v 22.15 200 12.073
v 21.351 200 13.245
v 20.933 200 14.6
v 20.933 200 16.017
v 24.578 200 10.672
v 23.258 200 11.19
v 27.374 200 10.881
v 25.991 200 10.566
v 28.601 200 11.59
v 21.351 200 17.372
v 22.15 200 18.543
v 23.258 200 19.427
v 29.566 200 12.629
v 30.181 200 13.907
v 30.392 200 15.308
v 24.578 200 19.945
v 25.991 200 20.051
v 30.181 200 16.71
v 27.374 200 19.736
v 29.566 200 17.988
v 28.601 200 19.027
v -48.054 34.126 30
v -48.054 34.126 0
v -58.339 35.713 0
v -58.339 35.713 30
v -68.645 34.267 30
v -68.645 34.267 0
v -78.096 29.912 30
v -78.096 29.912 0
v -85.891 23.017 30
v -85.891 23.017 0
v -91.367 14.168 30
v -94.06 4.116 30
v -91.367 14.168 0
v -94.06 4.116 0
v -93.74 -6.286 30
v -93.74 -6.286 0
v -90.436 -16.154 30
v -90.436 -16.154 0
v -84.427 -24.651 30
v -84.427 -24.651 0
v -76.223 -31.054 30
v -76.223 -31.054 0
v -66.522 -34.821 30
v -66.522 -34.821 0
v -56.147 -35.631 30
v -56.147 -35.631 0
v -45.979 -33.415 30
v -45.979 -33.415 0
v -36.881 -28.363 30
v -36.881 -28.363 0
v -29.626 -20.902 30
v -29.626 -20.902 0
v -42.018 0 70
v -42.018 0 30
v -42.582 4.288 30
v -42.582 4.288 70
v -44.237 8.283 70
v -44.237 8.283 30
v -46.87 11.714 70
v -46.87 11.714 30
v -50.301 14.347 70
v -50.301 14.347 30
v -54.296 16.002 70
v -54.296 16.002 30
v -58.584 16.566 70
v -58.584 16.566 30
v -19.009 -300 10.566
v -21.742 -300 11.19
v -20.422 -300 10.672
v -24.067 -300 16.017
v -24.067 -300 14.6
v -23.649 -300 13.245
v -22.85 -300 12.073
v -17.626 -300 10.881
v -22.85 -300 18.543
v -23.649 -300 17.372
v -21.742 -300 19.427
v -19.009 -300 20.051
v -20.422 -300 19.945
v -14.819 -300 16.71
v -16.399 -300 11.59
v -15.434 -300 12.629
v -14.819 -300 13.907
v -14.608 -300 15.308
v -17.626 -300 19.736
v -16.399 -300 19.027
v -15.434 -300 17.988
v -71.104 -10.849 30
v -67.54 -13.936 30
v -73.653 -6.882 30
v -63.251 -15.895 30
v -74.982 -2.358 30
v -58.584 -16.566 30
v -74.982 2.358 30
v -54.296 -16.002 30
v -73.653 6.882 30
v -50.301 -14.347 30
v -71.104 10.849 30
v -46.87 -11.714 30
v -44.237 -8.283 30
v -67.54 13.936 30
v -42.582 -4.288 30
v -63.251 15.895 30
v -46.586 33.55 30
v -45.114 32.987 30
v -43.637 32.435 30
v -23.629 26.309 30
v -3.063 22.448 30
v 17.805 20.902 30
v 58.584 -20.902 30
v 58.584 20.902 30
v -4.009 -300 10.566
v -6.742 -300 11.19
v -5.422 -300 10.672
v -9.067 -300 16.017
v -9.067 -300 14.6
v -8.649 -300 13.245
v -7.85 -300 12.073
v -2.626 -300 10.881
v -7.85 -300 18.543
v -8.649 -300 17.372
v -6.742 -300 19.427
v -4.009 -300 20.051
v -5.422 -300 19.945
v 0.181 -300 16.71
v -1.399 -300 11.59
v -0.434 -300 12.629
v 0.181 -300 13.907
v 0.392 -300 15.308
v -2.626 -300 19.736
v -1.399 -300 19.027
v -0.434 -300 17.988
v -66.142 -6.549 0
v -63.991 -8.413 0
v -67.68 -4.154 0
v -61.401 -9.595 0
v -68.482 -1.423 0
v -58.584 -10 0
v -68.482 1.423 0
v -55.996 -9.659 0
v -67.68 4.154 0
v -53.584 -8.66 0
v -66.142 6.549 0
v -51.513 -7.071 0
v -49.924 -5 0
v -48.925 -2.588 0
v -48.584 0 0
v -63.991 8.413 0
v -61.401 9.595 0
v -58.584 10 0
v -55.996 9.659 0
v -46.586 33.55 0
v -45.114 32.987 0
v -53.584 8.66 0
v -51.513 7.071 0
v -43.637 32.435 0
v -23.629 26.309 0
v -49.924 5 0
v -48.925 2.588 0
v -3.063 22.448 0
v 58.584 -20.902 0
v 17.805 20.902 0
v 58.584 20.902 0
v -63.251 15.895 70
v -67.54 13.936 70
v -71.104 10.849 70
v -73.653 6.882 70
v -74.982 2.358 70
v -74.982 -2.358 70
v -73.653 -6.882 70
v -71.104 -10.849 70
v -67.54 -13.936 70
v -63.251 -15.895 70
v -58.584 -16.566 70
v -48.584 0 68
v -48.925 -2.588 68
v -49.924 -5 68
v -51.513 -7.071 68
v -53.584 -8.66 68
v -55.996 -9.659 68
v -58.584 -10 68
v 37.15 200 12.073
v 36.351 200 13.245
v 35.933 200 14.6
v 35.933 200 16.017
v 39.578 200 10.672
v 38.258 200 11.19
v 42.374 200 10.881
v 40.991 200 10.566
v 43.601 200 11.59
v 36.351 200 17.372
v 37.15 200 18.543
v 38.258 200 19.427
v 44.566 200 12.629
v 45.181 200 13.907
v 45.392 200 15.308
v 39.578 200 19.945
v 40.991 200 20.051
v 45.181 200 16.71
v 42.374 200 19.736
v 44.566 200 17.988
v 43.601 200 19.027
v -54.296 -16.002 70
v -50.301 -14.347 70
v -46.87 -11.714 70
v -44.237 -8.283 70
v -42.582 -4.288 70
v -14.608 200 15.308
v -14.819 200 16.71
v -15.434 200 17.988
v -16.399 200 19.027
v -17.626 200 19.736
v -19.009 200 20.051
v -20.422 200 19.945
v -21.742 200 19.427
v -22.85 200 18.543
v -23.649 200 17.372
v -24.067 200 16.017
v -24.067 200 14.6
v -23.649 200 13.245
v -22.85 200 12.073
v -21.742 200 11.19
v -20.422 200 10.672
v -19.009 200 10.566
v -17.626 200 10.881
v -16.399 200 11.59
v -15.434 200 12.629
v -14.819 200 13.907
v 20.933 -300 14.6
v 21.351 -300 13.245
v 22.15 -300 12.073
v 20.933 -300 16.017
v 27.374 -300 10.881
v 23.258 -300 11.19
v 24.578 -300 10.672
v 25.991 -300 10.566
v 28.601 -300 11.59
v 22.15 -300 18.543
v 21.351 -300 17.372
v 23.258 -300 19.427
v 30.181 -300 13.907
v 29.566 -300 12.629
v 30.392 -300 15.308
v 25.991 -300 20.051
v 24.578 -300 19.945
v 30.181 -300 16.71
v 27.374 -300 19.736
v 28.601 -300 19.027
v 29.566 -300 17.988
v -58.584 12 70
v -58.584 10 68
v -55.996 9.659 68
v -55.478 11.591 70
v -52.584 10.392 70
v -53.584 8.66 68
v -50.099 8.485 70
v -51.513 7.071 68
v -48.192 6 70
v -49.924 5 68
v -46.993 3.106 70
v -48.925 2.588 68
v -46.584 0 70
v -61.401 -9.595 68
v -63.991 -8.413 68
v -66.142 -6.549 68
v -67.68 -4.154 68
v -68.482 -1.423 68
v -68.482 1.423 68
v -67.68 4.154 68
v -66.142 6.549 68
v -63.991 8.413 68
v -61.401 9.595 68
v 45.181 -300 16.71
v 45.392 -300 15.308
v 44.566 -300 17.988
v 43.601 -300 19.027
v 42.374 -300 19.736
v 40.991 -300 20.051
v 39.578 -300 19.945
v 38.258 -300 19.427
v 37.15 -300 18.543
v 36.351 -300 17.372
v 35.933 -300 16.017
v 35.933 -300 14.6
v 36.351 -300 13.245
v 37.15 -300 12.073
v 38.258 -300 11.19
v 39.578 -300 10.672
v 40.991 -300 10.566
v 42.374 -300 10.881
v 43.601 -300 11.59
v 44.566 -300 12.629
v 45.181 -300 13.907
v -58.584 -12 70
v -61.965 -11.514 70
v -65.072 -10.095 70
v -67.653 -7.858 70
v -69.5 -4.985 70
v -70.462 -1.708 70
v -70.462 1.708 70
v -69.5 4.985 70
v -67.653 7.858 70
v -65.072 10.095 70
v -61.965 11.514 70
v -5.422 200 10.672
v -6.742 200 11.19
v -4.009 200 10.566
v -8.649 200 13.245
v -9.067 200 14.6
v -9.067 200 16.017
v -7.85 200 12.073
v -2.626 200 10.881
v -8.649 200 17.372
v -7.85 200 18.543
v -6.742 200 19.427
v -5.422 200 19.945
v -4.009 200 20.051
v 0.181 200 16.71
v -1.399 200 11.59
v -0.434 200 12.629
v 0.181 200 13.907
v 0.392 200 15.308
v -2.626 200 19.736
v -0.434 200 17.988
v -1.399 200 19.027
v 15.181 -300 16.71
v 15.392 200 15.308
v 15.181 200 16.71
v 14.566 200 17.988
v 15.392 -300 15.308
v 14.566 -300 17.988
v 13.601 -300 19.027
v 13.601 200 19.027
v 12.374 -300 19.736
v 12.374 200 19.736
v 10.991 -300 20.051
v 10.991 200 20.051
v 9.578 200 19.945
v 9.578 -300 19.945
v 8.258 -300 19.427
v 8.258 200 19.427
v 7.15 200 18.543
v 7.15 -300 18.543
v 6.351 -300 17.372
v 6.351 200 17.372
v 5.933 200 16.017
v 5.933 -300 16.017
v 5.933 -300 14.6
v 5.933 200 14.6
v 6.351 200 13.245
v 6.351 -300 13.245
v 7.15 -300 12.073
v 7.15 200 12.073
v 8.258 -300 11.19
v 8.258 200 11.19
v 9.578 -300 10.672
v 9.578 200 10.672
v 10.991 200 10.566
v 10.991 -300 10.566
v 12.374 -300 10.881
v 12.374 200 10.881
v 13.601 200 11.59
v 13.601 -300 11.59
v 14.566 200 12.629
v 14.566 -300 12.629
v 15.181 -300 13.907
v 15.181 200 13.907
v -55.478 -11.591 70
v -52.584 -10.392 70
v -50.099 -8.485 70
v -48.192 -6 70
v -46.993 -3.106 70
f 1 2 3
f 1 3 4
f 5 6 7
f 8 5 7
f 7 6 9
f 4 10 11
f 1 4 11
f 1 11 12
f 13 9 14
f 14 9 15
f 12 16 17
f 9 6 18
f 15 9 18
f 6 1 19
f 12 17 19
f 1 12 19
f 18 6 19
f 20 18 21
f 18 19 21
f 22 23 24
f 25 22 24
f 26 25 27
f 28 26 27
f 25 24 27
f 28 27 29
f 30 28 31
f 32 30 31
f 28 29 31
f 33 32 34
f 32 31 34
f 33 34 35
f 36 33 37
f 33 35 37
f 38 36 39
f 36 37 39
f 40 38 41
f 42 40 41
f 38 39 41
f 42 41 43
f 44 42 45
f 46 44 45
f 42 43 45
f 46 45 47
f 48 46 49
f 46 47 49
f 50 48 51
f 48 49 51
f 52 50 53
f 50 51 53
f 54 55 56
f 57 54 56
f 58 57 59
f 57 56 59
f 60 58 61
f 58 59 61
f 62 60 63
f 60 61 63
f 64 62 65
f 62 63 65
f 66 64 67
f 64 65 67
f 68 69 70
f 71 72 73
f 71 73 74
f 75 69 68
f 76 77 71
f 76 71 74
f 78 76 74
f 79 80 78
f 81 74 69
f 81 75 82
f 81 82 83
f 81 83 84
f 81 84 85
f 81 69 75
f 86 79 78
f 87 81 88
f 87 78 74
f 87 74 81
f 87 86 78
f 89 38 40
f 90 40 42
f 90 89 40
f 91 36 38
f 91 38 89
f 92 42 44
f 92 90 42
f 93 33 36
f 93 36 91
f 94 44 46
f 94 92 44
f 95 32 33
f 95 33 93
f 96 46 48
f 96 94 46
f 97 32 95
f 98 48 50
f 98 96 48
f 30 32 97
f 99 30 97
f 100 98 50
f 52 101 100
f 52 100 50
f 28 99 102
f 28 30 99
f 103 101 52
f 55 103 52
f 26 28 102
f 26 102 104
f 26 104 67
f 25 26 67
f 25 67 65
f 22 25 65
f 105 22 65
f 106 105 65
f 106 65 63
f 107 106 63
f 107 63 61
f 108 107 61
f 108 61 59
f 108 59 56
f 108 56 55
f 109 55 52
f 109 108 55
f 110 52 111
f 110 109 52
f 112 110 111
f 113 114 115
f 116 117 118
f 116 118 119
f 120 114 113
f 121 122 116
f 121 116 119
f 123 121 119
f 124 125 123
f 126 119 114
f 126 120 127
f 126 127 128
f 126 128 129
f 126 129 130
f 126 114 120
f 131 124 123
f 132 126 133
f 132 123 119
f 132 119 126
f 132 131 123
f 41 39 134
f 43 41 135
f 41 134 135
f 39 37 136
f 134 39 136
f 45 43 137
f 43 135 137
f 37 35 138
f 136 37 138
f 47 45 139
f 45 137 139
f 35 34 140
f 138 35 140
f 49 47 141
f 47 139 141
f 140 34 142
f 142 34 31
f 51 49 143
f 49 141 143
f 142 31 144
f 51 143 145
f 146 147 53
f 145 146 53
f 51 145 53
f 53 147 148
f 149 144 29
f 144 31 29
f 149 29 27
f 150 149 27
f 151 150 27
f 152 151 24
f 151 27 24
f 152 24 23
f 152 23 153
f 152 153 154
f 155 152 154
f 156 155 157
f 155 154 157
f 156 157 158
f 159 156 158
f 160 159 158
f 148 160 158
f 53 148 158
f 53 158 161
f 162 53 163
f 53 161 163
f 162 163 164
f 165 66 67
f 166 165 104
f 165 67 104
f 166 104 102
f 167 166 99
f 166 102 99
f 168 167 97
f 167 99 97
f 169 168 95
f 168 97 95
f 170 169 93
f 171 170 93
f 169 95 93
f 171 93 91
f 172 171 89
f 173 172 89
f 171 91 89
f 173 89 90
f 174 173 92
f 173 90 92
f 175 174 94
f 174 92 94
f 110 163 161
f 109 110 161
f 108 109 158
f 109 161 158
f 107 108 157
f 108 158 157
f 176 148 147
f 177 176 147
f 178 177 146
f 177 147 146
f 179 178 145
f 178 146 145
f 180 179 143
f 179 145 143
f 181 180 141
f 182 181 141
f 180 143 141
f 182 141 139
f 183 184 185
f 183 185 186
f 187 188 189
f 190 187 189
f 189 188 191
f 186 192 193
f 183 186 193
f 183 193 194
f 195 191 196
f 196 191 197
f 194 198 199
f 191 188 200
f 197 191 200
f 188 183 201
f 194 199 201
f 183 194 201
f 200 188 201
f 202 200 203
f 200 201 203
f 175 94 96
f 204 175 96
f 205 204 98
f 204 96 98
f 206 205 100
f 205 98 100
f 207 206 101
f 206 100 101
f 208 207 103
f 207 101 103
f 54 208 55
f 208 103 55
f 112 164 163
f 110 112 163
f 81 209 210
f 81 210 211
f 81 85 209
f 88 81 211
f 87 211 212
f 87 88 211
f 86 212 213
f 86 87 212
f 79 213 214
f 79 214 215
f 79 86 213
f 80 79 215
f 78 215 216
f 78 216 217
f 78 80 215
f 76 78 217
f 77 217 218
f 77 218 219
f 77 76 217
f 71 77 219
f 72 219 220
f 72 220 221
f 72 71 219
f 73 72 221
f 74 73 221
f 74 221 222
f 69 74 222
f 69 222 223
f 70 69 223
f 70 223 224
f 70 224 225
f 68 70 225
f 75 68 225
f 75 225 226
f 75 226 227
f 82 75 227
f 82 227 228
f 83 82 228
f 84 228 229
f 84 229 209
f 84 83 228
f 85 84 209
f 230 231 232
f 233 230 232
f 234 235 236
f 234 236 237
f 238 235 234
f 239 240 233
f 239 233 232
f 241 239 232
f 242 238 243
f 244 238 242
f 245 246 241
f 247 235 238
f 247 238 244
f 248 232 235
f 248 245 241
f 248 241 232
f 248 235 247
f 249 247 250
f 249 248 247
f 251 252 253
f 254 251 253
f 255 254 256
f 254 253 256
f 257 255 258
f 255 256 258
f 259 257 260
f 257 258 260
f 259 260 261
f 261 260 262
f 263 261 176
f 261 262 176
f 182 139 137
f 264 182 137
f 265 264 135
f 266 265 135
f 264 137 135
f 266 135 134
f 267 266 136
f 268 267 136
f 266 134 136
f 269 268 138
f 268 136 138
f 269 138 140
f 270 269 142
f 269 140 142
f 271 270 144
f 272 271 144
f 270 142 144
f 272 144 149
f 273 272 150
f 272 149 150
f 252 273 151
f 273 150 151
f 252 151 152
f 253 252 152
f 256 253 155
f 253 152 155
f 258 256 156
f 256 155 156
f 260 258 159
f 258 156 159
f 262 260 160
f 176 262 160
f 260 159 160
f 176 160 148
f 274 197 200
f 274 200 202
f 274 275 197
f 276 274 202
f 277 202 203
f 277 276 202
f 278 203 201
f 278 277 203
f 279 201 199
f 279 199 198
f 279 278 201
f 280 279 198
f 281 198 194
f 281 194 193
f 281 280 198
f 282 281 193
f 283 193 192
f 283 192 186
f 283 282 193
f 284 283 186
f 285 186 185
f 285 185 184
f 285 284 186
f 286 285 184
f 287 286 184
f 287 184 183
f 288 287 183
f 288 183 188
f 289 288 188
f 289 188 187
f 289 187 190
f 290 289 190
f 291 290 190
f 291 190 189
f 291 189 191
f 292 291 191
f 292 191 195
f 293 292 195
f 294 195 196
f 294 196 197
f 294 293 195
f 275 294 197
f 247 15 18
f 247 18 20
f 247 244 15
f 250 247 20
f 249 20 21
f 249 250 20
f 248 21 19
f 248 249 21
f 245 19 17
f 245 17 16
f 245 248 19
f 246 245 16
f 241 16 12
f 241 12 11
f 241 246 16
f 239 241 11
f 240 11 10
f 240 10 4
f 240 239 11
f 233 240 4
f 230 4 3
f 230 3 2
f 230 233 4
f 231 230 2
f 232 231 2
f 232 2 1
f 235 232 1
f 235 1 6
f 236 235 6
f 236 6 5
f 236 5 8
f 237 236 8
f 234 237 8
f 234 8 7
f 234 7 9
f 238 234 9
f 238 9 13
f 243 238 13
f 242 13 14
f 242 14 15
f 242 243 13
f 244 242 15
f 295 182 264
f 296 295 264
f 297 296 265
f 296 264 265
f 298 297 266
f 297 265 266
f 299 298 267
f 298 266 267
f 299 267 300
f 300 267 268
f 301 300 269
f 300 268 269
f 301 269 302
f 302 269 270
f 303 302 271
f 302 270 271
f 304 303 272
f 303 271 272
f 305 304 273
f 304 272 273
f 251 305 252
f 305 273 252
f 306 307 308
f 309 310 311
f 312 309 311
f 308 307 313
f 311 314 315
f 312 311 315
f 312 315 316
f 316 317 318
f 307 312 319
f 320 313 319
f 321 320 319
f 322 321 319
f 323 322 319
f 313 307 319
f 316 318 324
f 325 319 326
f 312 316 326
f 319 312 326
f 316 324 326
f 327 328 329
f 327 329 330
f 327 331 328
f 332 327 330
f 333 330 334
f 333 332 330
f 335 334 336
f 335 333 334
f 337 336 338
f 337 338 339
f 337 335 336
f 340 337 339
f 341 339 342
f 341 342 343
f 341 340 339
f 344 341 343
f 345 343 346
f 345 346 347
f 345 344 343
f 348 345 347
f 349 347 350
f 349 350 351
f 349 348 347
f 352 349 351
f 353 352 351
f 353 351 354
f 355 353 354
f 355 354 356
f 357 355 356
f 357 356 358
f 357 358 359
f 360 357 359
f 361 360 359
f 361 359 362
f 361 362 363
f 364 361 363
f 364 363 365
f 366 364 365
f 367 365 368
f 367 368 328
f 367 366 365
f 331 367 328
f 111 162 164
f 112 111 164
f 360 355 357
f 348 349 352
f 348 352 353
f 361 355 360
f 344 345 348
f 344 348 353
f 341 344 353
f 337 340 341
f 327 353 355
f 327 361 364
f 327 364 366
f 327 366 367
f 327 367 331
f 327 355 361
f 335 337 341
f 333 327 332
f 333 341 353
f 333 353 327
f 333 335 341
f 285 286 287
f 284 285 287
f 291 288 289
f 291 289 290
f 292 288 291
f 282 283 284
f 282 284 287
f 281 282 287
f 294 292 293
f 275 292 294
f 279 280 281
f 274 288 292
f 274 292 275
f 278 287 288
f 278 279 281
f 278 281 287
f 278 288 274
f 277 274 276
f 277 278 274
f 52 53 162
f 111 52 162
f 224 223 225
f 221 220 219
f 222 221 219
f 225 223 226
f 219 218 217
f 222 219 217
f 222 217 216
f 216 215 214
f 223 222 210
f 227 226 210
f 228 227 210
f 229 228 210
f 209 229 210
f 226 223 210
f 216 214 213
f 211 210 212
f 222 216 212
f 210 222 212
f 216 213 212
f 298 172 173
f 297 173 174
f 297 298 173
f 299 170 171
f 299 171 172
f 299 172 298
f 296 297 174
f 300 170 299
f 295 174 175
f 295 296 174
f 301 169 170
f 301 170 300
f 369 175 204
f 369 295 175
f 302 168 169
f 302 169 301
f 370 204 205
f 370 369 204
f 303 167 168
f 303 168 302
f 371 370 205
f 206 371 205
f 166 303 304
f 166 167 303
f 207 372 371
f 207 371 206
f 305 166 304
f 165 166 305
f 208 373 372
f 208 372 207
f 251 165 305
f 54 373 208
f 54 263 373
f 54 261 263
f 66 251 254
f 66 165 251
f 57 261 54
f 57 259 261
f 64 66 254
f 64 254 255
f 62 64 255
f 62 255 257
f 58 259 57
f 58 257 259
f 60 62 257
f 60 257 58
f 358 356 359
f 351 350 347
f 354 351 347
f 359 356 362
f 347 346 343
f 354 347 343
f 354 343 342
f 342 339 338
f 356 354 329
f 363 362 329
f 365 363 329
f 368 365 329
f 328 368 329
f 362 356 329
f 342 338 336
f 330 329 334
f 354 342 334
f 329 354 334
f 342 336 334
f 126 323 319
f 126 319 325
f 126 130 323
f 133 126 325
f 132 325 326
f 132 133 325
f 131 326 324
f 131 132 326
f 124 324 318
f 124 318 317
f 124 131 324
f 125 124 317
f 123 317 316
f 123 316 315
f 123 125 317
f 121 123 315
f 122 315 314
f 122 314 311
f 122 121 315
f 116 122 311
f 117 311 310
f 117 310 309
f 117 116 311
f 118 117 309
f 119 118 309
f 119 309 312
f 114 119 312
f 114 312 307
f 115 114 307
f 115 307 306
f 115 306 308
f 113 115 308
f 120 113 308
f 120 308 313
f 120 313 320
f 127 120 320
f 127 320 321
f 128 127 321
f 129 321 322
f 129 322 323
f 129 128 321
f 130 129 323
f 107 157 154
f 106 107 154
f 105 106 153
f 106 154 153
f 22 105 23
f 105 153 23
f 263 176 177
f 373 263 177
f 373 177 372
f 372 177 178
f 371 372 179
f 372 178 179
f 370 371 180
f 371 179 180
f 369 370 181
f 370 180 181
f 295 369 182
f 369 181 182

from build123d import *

# Parameters (mm, degrees)
F1_DEPTH      = 30
F2_DEPTH      = 70
F3_SIZE       = 2
F4_R          = 4.7560570879
F5_DEPTH      = 300
F5_DEPTH_BACK = 200


with BuildPart() as f1:
    # F0 (on Top) → F1 (new body)
    with BuildSketch(Plane.XY):
        with BuildLine():
            ThreePointArc((-48.0539615262, 34.1261437092), (-92.4493983085, -11.341099035), (-29.6257035051, -20.9018699825))
            Line((-29.6257035051, -20.9018699825), (-58.5841163993, -20.9018699825))
            Line((-58.5841163993, -20.9018699825), (-58.5841163993, -16.5661355414))
            ThreePointArc((-58.5841163993, -16.5661355414), (-75.1502519407, 0), (-58.5841163993, 16.5661355414))
            Line((-58.5841163993, 16.5661355414), (-58.5841163993, 20.9018699825))
            Line((-58.5841163993, 20.9018699825), (-29.6257035051, 20.9018699825))
            ThreePointArc((-29.6257035051, 20.9018699825), (-35.8864992973, 27.5734659411), (-43.6369066992, 32.4354554199))
            ThreePointArc((-43.6369066992, 32.4354554199), (-45.8507622784, 33.2668793167), (-48.0539615262, 34.1261437092))
        make_face()
        with BuildLine():
            Line((-58.5841163993, -20.9018699825), (-29.6257035051, -20.9018699825))
            ThreePointArc((-29.6257035051, -20.9018699825), (-24.6010782812, -10.9832129352), (-22.8702836994, 0))
            ThreePointArc((-22.8702836994, 0), (-24.6010782812, 10.9832129352), (-29.6257035051, 20.9018699825))
            Line((-29.6257035051, 20.9018699825), (-58.5841163993, 20.9018699825))
            Line((-58.5841163993, 20.9018699825), (-58.5841163993, 16.5661355414))
            ThreePointArc((-58.5841163993, 16.5661355414), (-46.8700896199, 11.7140267794), (-42.0179808579, 0))
            ThreePointArc((-42.0179808579, 0), (-46.8700896199, -11.7140267794), (-58.5841163993, -16.5661355414))
            Line((-58.5841163993, -16.5661355414), (-58.5841163993, -20.9018699825))
        make_face()
        with BuildLine():
            Line((-29.6257035051, 20.9018699825), (17.8047399968, 20.9018699825))
            ThreePointArc((17.8047399968, 20.9018699825), (-13.3998865309, 24.0913493238), (-43.6369066992, 32.4354554199))
            ThreePointArc((-43.6369066992, 32.4354554199), (-35.8864992973, 27.5734659411), (-29.6257035051, 20.9018699825))
        make_face()
        with BuildLine():
            Line((-29.6257035051, -20.9018699825), (58.5841163993, -20.9018699825))
            Line((58.5841163993, -20.9018699825), (58.5841163993, 20.9018699825))
            Line((58.5841163993, 20.9018699825), (17.8047399968, 20.9018699825))
            Line((17.8047399968, 20.9018699825), (-29.6257035051, 20.9018699825))
            ThreePointArc((-29.6257035051, 20.9018699825), (-24.6010782812, 10.9832129352), (-22.8702836994, 0))
            ThreePointArc((-22.8702836994, 0), (-24.6010782812, -10.9832129352), (-29.6257035051, -20.9018699825))
        make_face()
    extrude(amount=F1_DEPTH)

    # F0 (on Top) → F2 (join)
    with BuildSketch(Plane.XY):
        with BuildLine():
            ThreePointArc((-58.5841163993, 16.5661355414), (-75.1502519407, 0), (-58.5841163993, -16.5661355414))
            Line((-58.5841163993, -16.5661355414), (-58.5841163993, -10))
            ThreePointArc((-58.5841163993, -10), (-68.5841163993, 0), (-58.5841163993, 10))
            Line((-58.5841163993, 10), (-58.5841163993, 16.5661355414))
        make_face()
        with BuildLine():
            Line((-58.5841163993, -10), (-58.5841163993, -16.5661355414))
            ThreePointArc((-58.5841163993, -16.5661355414), (-46.8700896199, -11.7140267794), (-42.0179808579, 0))
            ThreePointArc((-42.0179808579, 0), (-46.8700896199, 11.7140267794), (-58.5841163993, 16.5661355414))
            Line((-58.5841163993, 16.5661355414), (-58.5841163993, 10))
            ThreePointArc((-58.5841163993, 10), (-51.5130485874, 7.0710678119), (-48.5841163993, 0))
            ThreePointArc((-48.5841163993, 0), (-51.5130485874, -7.0710678119), (-58.5841163993, -10))
        make_face()
    extrude(amount=F2_DEPTH)

    # F3
    f3_edges = [f1.edges().sort_by_distance(p)[0] for p in [
        (-58.584116, -10, 70),
    ]]
    chamfer(f3_edges, length=F3_SIZE)


with BuildPart() as f5:
    # F4 (on Front) → F5 (new body, two sides)
    with BuildSketch(Plane.XZ) as f5_sk:
        with Locations((-19.3639267236, 15.3084117919)):
            Circle(F4_R)
    extrude(amount=F5_DEPTH)
    extrude(f5_sk.sketch, amount=-F5_DEPTH_BACK)


with BuildPart() as f5b:
    # F4 (on Front) → F5, piece 2 (new body, two sides)
    with BuildSketch(Plane.XZ) as f5_2_sk:
        with Locations((-4.3639267236, 15.3084117919)):
            Circle(F4_R)
    extrude(amount=F5_DEPTH)
    extrude(f5_2_sk.sketch, amount=-F5_DEPTH_BACK)


with BuildPart() as f5c:
    # F4 (on Front) → F5, piece 3 (new body, two sides)
    with BuildSketch(Plane.XZ) as f5_3_sk:
        with Locations((10.6360732764, 15.3084117919)):
            Circle(F4_R)
    extrude(amount=F5_DEPTH)
    extrude(f5_3_sk.sketch, amount=-F5_DEPTH_BACK)


with BuildPart() as f5d:
    # F4 (on Front) → F5, piece 4 (new body, two sides)
    with BuildSketch(Plane.XZ) as f5_4_sk:
        with Locations((25.6360732764, 15.3084117919)):
            Circle(F4_R)
    extrude(amount=F5_DEPTH)
    extrude(f5_4_sk.sketch, amount=-F5_DEPTH_BACK)


with BuildPart() as f5e:
    # F4 (on Front) → F5, piece 5 (new body, two sides)
    with BuildSketch(Plane.XZ) as f5_5_sk:
        with Locations((40.6360732764, 15.3084117919)):
            Circle(F4_R)
    extrude(amount=F5_DEPTH)
    extrude(f5_5_sk.sketch, amount=-F5_DEPTH_BACK)


solid = Compound([f1.part, f5.part, f5b.part, f5c.part, f5d.part, f5e.part])
